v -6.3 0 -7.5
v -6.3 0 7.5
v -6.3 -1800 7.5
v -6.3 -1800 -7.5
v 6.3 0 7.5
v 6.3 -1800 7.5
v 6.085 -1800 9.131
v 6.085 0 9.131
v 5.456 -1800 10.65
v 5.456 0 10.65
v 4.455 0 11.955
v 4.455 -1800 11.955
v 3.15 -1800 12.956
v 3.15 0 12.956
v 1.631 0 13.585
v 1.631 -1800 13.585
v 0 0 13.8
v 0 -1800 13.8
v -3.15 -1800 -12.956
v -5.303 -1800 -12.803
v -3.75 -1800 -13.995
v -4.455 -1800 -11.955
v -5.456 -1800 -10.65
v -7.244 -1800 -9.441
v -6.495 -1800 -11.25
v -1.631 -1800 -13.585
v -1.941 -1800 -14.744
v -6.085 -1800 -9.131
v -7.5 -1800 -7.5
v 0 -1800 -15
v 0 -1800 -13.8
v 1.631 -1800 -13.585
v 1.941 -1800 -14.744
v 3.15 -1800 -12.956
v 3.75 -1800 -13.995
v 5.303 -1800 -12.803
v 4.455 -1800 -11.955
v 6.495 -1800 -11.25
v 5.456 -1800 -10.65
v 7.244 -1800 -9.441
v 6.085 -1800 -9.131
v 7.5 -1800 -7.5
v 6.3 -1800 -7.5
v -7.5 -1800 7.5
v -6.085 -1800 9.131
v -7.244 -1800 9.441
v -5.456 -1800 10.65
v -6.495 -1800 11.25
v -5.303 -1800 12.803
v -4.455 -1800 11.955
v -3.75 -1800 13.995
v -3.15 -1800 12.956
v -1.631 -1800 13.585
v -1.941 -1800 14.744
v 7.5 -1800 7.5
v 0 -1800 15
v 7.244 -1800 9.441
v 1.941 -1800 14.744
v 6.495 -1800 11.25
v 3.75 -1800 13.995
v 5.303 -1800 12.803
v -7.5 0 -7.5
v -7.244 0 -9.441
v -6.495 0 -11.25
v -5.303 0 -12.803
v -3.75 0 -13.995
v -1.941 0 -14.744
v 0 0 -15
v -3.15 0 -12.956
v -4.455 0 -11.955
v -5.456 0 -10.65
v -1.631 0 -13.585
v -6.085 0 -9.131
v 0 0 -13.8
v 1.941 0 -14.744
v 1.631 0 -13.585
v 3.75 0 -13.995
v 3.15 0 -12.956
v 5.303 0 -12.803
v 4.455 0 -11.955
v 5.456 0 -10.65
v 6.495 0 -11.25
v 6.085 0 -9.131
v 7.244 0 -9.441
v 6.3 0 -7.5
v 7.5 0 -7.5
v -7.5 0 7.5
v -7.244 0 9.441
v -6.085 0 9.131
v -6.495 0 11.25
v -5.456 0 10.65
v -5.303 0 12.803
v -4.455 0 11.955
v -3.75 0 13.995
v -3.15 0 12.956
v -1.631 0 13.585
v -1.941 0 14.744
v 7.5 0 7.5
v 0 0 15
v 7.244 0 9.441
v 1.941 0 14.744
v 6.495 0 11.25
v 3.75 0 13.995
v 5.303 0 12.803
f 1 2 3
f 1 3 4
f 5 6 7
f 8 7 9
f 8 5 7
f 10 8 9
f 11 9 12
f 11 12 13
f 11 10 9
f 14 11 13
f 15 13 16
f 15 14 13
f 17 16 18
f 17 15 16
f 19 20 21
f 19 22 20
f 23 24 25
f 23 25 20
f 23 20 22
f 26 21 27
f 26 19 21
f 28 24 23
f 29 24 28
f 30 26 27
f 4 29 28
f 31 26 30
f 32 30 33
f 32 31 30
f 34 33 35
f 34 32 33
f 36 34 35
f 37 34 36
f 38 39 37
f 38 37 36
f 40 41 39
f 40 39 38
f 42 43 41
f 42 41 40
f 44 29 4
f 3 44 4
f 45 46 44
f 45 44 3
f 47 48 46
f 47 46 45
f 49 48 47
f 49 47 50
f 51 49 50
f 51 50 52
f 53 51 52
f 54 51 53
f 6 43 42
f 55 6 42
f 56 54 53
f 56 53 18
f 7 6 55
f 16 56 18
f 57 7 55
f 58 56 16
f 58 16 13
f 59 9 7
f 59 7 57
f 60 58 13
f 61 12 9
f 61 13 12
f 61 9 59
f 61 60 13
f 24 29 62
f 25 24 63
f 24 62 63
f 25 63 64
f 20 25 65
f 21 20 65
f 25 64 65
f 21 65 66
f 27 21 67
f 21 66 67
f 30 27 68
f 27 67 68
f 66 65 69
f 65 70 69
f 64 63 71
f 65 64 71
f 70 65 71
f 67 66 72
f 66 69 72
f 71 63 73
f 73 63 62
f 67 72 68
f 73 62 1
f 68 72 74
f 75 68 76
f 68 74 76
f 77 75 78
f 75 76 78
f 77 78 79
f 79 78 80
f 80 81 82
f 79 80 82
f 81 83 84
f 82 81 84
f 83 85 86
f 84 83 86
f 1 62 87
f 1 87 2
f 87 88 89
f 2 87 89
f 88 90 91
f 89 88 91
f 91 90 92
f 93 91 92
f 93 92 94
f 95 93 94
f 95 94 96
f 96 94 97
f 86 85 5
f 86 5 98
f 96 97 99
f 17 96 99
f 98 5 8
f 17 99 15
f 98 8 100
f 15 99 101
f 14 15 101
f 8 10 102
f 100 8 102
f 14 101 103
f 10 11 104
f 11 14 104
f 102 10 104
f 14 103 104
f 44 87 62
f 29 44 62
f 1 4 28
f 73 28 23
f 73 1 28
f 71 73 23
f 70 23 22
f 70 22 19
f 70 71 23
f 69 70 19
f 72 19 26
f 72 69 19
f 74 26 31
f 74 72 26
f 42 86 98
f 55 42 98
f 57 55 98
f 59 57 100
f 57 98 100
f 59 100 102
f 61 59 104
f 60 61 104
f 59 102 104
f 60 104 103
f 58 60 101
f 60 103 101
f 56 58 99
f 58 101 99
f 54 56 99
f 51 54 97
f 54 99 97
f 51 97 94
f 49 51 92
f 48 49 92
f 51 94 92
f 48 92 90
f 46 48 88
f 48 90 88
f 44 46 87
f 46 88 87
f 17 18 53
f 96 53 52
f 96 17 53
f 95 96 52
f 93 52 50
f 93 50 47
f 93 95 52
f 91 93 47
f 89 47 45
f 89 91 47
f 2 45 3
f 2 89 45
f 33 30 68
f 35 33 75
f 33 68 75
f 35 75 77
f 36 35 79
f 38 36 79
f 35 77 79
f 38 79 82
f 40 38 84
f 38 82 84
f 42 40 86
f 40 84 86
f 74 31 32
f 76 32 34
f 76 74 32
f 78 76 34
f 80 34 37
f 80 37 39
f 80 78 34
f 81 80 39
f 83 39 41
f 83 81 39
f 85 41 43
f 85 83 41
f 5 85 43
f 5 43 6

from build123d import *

# Parameters (mm, degrees)
F1_DEPTH = 1800
F2_T     = -1.2


with BuildPart() as f1:
    # F0 (on Front) → F1 (new body)
    with BuildSketch(Plane.XZ):
        with BuildLine():
            ThreePointArc((0, 15), (-5.303301, 12.803301), (-7.5, 7.5))
            Line((-7.5, 7.5), (-7.5, -7.5))
            ThreePointArc((-7.5, -7.5), (-5.303301, -12.803301), (0, -15))
            ThreePointArc((0, -15), (5.303301, -12.803301), (7.5, -7.5))
            Line((7.5, -7.5), (7.5, 7.5))
            ThreePointArc((7.5, 7.5), (5.303301, 12.803301), (0, 15))
        make_face()
    extrude(amount=F1_DEPTH)

    # F2
    f2_openings = [f1.faces().sort_by_distance(p)[0] for p in [
        (0, -1800, 0),
        (0, 0, 0),
    ]]
    offset(amount=F2_T, openings=f2_openings)


solid = f1.part
